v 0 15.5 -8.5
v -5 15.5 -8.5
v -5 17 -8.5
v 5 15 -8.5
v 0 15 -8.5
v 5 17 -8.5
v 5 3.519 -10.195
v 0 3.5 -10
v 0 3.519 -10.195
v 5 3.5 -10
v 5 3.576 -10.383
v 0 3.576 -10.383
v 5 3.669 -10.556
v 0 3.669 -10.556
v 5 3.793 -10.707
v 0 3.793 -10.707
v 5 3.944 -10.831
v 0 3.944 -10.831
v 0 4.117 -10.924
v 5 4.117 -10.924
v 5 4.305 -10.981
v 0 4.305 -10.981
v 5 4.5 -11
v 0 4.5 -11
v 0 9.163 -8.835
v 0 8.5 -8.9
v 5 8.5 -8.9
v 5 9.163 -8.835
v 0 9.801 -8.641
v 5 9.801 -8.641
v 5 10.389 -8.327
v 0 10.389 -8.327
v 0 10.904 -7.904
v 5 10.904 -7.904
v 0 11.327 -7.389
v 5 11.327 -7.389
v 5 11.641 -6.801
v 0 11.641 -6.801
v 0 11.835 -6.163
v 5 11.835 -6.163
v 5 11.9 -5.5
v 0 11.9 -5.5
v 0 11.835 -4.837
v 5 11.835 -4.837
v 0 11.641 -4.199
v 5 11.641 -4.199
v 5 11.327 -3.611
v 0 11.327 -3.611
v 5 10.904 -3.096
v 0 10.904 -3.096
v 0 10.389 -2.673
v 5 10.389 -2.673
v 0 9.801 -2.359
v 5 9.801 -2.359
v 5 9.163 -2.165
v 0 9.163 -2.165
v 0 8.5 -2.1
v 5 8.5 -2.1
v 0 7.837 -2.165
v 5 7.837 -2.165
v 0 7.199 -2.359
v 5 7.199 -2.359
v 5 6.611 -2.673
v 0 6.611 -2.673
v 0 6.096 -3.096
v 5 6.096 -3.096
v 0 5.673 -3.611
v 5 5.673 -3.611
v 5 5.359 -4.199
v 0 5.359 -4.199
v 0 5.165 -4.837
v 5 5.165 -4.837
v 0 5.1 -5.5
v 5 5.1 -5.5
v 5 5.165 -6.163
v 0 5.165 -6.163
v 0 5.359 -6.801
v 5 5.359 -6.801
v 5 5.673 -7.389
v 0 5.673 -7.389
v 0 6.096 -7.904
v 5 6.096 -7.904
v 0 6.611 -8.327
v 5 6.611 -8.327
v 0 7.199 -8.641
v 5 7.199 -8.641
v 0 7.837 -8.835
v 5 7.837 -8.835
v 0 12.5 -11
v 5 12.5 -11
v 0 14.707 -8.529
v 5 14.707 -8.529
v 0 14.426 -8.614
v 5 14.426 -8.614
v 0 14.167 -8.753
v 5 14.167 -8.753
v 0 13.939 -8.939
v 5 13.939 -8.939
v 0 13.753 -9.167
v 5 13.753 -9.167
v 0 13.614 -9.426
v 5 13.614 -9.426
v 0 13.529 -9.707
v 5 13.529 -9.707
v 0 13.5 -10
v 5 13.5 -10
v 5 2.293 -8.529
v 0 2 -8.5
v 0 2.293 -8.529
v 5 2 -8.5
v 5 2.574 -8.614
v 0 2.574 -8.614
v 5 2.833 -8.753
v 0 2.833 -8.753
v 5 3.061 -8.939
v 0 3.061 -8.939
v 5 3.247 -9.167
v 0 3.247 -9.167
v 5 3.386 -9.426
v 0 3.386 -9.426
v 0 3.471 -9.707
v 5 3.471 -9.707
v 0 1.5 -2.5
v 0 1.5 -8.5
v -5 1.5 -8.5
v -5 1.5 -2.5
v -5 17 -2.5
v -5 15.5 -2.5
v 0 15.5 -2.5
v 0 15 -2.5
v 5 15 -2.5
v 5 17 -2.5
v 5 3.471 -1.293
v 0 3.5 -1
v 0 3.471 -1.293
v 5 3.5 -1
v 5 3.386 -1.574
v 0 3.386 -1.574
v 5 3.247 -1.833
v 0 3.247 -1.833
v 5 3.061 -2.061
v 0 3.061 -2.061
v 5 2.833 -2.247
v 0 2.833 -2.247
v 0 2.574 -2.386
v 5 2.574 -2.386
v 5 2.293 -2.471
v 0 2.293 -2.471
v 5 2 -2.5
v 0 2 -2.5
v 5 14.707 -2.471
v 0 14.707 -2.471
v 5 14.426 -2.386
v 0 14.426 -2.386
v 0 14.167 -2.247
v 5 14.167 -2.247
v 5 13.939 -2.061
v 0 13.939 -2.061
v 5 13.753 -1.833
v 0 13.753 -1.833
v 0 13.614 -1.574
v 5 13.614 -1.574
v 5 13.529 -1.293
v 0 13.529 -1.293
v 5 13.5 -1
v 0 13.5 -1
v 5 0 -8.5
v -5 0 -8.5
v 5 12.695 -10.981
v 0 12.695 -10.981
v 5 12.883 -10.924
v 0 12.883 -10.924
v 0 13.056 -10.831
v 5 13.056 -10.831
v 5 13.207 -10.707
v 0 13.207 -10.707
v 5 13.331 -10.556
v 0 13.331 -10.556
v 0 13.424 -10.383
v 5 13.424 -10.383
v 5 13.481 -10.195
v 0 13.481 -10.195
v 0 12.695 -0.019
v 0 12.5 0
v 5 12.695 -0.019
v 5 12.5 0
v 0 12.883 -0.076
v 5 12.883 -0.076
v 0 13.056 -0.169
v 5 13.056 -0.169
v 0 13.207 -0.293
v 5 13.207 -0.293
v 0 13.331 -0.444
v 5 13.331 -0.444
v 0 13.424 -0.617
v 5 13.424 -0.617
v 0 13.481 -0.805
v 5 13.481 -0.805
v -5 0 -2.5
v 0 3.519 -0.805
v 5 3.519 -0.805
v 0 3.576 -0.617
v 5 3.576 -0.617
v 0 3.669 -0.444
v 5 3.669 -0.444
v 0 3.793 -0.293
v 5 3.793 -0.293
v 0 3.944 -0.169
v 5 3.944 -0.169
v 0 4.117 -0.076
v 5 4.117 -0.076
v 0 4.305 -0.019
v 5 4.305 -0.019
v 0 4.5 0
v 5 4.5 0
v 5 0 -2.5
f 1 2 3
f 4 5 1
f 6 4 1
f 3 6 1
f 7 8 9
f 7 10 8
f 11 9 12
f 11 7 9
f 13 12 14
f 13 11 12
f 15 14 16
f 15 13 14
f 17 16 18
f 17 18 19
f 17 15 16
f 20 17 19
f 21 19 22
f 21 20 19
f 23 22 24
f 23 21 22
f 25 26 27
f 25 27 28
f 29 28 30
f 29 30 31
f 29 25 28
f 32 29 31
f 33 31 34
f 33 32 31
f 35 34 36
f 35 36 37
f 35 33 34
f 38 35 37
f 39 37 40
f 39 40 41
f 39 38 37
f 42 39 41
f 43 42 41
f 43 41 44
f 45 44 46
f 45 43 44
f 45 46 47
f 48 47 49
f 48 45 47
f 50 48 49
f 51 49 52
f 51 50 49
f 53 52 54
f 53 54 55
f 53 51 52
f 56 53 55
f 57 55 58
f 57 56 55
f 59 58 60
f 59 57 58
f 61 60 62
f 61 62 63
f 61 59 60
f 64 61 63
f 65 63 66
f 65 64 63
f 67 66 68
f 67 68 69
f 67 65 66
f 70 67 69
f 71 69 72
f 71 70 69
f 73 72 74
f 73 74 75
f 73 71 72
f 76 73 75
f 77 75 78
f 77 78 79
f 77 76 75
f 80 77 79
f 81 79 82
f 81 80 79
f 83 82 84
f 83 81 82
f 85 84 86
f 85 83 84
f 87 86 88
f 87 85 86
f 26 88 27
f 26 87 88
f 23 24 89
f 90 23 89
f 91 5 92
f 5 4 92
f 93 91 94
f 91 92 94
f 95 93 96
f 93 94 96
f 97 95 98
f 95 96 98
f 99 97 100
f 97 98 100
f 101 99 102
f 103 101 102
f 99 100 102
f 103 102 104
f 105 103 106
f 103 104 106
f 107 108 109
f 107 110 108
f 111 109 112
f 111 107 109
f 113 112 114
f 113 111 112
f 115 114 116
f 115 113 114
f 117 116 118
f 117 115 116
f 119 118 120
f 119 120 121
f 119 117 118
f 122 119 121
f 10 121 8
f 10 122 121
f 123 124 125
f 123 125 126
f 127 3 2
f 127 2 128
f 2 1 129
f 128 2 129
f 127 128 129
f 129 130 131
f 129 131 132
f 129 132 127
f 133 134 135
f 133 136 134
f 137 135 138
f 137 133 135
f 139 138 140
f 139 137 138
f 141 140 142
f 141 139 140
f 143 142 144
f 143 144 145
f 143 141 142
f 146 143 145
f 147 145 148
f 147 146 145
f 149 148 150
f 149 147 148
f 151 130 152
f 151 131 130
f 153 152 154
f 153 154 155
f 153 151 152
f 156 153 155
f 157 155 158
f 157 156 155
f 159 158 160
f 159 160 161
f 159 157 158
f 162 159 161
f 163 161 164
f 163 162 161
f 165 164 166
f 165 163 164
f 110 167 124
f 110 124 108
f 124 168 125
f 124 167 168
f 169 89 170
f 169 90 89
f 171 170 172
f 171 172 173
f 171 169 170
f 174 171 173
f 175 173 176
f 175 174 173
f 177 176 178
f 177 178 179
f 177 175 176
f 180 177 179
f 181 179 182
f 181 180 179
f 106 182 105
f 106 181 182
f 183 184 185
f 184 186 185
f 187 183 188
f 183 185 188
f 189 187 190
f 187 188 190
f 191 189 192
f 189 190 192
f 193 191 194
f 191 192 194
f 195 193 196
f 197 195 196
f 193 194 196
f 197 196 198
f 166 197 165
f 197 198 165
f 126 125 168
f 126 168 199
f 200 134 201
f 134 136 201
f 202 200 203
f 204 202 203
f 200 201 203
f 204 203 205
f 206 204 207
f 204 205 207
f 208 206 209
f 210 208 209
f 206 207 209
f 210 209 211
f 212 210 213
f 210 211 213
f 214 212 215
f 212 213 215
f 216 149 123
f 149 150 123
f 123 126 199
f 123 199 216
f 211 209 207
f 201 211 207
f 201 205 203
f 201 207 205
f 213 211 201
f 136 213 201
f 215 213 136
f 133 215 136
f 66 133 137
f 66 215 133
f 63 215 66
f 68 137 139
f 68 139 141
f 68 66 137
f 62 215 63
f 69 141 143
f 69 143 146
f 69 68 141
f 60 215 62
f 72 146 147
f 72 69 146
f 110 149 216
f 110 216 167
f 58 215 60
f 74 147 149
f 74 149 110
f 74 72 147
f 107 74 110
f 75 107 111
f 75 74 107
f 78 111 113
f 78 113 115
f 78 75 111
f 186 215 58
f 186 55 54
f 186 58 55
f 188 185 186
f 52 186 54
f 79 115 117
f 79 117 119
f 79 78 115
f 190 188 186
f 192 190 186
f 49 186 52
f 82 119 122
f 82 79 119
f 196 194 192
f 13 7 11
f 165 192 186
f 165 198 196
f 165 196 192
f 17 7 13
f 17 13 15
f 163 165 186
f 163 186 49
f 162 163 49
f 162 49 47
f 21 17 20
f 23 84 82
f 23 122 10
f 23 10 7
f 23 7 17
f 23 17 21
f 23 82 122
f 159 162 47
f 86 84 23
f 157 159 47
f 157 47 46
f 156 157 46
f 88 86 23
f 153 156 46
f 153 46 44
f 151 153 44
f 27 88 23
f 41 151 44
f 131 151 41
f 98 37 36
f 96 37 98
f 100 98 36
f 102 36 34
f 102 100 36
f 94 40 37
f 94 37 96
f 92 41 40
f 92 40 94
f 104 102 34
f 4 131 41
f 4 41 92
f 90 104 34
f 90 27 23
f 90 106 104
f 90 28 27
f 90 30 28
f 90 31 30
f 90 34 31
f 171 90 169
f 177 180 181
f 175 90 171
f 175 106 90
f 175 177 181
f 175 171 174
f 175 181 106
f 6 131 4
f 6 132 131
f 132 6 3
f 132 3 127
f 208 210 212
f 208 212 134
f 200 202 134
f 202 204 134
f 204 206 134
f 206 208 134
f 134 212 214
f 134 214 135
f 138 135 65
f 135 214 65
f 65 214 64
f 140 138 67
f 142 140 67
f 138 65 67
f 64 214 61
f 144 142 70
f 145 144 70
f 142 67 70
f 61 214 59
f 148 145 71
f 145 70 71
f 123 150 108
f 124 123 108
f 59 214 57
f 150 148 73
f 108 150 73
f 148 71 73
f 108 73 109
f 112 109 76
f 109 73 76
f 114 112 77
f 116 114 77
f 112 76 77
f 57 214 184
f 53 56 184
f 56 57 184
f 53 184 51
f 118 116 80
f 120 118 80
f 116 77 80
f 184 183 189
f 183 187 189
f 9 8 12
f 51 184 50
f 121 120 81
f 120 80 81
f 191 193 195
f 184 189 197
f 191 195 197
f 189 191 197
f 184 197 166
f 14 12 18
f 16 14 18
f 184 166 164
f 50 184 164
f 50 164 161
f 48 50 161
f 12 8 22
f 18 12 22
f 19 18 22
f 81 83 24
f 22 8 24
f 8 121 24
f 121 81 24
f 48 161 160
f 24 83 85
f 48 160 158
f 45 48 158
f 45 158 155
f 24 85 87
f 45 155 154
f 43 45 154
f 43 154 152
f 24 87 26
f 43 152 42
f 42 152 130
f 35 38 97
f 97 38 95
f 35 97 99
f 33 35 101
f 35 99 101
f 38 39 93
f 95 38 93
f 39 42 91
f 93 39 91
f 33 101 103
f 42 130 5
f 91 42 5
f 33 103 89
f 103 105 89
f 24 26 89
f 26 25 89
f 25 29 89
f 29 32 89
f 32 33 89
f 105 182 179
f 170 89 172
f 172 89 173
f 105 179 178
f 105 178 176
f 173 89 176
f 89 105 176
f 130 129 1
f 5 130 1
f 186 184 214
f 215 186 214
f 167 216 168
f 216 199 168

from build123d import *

# Parameters (mm, degrees)
SKETCH1_R           = 3.4
BOSS_EXTRUDE1_DEPTH = 5
SKETCH3_W           = 6
SKETCH3_H           = 1.5
BOSS_EXTRUDE2_DEPTH = 5
FILLET2_R           = 1.5
FILLET3_R           = 1


with BuildPart() as part:
    # Sketch1 → Boss-Extrude1 (new body)
    with BuildSketch(Plane(origin=(0, 0, 0), x_dir=(0, 0, -1), z_dir=(1, 0, 0))):
        Polygon((2.5, 0), (8.5, 0), (8.5, 3.5), (11, 3.5), (11, 13.5), (8.5, 13.5), (8.5, 17), (2.5, 17), (2.5, 13.5), (0, 13.5), (0, 3.5), (2.5, 3.5), align=None)
        with Locations((5.5, 8.5)):
            Circle(SKETCH1_R, mode=Mode.SUBTRACT)
    extrude(amount=BOSS_EXTRUDE1_DEPTH)

    # Sketch3 → Boss-Extrude2 (add)
    with BuildSketch(Plane.ZY):
        with Locations((-5.5, 16.25)):
            Rectangle(SKETCH3_W, SKETCH3_H)
        with Locations((-5.5, 0.75)):
            Rectangle(SKETCH3_W, SKETCH3_H)
    extrude(amount=BOSS_EXTRUDE2_DEPTH)

    # Fillet2
    fillet2_edges = [part.edges().sort_by_distance(p)[0] for p in [
        (2.5, 13.5, -8.5),
        (2.5, 13.5, -2.5),
        (2.5, 3.5, -2.5),
        (2.5, 3.5, -8.5),
    ]]
    fillet(fillet2_edges, radius=FILLET2_R)

    # Fillet3
    fillet3_edges = [part.edges().sort_by_distance(p)[0] for p in [
        (2.5, 3.5, -11),
        (2.5, 3.5, 0),
        (2.5, 13.5, 0),
        (2.5, 13.5, -11),
    ]]
    fillet(fillet3_edges, radius=FILLET3_R - 0.0001)  # a hair under: the kernel refuses the full size


solid = part.part
